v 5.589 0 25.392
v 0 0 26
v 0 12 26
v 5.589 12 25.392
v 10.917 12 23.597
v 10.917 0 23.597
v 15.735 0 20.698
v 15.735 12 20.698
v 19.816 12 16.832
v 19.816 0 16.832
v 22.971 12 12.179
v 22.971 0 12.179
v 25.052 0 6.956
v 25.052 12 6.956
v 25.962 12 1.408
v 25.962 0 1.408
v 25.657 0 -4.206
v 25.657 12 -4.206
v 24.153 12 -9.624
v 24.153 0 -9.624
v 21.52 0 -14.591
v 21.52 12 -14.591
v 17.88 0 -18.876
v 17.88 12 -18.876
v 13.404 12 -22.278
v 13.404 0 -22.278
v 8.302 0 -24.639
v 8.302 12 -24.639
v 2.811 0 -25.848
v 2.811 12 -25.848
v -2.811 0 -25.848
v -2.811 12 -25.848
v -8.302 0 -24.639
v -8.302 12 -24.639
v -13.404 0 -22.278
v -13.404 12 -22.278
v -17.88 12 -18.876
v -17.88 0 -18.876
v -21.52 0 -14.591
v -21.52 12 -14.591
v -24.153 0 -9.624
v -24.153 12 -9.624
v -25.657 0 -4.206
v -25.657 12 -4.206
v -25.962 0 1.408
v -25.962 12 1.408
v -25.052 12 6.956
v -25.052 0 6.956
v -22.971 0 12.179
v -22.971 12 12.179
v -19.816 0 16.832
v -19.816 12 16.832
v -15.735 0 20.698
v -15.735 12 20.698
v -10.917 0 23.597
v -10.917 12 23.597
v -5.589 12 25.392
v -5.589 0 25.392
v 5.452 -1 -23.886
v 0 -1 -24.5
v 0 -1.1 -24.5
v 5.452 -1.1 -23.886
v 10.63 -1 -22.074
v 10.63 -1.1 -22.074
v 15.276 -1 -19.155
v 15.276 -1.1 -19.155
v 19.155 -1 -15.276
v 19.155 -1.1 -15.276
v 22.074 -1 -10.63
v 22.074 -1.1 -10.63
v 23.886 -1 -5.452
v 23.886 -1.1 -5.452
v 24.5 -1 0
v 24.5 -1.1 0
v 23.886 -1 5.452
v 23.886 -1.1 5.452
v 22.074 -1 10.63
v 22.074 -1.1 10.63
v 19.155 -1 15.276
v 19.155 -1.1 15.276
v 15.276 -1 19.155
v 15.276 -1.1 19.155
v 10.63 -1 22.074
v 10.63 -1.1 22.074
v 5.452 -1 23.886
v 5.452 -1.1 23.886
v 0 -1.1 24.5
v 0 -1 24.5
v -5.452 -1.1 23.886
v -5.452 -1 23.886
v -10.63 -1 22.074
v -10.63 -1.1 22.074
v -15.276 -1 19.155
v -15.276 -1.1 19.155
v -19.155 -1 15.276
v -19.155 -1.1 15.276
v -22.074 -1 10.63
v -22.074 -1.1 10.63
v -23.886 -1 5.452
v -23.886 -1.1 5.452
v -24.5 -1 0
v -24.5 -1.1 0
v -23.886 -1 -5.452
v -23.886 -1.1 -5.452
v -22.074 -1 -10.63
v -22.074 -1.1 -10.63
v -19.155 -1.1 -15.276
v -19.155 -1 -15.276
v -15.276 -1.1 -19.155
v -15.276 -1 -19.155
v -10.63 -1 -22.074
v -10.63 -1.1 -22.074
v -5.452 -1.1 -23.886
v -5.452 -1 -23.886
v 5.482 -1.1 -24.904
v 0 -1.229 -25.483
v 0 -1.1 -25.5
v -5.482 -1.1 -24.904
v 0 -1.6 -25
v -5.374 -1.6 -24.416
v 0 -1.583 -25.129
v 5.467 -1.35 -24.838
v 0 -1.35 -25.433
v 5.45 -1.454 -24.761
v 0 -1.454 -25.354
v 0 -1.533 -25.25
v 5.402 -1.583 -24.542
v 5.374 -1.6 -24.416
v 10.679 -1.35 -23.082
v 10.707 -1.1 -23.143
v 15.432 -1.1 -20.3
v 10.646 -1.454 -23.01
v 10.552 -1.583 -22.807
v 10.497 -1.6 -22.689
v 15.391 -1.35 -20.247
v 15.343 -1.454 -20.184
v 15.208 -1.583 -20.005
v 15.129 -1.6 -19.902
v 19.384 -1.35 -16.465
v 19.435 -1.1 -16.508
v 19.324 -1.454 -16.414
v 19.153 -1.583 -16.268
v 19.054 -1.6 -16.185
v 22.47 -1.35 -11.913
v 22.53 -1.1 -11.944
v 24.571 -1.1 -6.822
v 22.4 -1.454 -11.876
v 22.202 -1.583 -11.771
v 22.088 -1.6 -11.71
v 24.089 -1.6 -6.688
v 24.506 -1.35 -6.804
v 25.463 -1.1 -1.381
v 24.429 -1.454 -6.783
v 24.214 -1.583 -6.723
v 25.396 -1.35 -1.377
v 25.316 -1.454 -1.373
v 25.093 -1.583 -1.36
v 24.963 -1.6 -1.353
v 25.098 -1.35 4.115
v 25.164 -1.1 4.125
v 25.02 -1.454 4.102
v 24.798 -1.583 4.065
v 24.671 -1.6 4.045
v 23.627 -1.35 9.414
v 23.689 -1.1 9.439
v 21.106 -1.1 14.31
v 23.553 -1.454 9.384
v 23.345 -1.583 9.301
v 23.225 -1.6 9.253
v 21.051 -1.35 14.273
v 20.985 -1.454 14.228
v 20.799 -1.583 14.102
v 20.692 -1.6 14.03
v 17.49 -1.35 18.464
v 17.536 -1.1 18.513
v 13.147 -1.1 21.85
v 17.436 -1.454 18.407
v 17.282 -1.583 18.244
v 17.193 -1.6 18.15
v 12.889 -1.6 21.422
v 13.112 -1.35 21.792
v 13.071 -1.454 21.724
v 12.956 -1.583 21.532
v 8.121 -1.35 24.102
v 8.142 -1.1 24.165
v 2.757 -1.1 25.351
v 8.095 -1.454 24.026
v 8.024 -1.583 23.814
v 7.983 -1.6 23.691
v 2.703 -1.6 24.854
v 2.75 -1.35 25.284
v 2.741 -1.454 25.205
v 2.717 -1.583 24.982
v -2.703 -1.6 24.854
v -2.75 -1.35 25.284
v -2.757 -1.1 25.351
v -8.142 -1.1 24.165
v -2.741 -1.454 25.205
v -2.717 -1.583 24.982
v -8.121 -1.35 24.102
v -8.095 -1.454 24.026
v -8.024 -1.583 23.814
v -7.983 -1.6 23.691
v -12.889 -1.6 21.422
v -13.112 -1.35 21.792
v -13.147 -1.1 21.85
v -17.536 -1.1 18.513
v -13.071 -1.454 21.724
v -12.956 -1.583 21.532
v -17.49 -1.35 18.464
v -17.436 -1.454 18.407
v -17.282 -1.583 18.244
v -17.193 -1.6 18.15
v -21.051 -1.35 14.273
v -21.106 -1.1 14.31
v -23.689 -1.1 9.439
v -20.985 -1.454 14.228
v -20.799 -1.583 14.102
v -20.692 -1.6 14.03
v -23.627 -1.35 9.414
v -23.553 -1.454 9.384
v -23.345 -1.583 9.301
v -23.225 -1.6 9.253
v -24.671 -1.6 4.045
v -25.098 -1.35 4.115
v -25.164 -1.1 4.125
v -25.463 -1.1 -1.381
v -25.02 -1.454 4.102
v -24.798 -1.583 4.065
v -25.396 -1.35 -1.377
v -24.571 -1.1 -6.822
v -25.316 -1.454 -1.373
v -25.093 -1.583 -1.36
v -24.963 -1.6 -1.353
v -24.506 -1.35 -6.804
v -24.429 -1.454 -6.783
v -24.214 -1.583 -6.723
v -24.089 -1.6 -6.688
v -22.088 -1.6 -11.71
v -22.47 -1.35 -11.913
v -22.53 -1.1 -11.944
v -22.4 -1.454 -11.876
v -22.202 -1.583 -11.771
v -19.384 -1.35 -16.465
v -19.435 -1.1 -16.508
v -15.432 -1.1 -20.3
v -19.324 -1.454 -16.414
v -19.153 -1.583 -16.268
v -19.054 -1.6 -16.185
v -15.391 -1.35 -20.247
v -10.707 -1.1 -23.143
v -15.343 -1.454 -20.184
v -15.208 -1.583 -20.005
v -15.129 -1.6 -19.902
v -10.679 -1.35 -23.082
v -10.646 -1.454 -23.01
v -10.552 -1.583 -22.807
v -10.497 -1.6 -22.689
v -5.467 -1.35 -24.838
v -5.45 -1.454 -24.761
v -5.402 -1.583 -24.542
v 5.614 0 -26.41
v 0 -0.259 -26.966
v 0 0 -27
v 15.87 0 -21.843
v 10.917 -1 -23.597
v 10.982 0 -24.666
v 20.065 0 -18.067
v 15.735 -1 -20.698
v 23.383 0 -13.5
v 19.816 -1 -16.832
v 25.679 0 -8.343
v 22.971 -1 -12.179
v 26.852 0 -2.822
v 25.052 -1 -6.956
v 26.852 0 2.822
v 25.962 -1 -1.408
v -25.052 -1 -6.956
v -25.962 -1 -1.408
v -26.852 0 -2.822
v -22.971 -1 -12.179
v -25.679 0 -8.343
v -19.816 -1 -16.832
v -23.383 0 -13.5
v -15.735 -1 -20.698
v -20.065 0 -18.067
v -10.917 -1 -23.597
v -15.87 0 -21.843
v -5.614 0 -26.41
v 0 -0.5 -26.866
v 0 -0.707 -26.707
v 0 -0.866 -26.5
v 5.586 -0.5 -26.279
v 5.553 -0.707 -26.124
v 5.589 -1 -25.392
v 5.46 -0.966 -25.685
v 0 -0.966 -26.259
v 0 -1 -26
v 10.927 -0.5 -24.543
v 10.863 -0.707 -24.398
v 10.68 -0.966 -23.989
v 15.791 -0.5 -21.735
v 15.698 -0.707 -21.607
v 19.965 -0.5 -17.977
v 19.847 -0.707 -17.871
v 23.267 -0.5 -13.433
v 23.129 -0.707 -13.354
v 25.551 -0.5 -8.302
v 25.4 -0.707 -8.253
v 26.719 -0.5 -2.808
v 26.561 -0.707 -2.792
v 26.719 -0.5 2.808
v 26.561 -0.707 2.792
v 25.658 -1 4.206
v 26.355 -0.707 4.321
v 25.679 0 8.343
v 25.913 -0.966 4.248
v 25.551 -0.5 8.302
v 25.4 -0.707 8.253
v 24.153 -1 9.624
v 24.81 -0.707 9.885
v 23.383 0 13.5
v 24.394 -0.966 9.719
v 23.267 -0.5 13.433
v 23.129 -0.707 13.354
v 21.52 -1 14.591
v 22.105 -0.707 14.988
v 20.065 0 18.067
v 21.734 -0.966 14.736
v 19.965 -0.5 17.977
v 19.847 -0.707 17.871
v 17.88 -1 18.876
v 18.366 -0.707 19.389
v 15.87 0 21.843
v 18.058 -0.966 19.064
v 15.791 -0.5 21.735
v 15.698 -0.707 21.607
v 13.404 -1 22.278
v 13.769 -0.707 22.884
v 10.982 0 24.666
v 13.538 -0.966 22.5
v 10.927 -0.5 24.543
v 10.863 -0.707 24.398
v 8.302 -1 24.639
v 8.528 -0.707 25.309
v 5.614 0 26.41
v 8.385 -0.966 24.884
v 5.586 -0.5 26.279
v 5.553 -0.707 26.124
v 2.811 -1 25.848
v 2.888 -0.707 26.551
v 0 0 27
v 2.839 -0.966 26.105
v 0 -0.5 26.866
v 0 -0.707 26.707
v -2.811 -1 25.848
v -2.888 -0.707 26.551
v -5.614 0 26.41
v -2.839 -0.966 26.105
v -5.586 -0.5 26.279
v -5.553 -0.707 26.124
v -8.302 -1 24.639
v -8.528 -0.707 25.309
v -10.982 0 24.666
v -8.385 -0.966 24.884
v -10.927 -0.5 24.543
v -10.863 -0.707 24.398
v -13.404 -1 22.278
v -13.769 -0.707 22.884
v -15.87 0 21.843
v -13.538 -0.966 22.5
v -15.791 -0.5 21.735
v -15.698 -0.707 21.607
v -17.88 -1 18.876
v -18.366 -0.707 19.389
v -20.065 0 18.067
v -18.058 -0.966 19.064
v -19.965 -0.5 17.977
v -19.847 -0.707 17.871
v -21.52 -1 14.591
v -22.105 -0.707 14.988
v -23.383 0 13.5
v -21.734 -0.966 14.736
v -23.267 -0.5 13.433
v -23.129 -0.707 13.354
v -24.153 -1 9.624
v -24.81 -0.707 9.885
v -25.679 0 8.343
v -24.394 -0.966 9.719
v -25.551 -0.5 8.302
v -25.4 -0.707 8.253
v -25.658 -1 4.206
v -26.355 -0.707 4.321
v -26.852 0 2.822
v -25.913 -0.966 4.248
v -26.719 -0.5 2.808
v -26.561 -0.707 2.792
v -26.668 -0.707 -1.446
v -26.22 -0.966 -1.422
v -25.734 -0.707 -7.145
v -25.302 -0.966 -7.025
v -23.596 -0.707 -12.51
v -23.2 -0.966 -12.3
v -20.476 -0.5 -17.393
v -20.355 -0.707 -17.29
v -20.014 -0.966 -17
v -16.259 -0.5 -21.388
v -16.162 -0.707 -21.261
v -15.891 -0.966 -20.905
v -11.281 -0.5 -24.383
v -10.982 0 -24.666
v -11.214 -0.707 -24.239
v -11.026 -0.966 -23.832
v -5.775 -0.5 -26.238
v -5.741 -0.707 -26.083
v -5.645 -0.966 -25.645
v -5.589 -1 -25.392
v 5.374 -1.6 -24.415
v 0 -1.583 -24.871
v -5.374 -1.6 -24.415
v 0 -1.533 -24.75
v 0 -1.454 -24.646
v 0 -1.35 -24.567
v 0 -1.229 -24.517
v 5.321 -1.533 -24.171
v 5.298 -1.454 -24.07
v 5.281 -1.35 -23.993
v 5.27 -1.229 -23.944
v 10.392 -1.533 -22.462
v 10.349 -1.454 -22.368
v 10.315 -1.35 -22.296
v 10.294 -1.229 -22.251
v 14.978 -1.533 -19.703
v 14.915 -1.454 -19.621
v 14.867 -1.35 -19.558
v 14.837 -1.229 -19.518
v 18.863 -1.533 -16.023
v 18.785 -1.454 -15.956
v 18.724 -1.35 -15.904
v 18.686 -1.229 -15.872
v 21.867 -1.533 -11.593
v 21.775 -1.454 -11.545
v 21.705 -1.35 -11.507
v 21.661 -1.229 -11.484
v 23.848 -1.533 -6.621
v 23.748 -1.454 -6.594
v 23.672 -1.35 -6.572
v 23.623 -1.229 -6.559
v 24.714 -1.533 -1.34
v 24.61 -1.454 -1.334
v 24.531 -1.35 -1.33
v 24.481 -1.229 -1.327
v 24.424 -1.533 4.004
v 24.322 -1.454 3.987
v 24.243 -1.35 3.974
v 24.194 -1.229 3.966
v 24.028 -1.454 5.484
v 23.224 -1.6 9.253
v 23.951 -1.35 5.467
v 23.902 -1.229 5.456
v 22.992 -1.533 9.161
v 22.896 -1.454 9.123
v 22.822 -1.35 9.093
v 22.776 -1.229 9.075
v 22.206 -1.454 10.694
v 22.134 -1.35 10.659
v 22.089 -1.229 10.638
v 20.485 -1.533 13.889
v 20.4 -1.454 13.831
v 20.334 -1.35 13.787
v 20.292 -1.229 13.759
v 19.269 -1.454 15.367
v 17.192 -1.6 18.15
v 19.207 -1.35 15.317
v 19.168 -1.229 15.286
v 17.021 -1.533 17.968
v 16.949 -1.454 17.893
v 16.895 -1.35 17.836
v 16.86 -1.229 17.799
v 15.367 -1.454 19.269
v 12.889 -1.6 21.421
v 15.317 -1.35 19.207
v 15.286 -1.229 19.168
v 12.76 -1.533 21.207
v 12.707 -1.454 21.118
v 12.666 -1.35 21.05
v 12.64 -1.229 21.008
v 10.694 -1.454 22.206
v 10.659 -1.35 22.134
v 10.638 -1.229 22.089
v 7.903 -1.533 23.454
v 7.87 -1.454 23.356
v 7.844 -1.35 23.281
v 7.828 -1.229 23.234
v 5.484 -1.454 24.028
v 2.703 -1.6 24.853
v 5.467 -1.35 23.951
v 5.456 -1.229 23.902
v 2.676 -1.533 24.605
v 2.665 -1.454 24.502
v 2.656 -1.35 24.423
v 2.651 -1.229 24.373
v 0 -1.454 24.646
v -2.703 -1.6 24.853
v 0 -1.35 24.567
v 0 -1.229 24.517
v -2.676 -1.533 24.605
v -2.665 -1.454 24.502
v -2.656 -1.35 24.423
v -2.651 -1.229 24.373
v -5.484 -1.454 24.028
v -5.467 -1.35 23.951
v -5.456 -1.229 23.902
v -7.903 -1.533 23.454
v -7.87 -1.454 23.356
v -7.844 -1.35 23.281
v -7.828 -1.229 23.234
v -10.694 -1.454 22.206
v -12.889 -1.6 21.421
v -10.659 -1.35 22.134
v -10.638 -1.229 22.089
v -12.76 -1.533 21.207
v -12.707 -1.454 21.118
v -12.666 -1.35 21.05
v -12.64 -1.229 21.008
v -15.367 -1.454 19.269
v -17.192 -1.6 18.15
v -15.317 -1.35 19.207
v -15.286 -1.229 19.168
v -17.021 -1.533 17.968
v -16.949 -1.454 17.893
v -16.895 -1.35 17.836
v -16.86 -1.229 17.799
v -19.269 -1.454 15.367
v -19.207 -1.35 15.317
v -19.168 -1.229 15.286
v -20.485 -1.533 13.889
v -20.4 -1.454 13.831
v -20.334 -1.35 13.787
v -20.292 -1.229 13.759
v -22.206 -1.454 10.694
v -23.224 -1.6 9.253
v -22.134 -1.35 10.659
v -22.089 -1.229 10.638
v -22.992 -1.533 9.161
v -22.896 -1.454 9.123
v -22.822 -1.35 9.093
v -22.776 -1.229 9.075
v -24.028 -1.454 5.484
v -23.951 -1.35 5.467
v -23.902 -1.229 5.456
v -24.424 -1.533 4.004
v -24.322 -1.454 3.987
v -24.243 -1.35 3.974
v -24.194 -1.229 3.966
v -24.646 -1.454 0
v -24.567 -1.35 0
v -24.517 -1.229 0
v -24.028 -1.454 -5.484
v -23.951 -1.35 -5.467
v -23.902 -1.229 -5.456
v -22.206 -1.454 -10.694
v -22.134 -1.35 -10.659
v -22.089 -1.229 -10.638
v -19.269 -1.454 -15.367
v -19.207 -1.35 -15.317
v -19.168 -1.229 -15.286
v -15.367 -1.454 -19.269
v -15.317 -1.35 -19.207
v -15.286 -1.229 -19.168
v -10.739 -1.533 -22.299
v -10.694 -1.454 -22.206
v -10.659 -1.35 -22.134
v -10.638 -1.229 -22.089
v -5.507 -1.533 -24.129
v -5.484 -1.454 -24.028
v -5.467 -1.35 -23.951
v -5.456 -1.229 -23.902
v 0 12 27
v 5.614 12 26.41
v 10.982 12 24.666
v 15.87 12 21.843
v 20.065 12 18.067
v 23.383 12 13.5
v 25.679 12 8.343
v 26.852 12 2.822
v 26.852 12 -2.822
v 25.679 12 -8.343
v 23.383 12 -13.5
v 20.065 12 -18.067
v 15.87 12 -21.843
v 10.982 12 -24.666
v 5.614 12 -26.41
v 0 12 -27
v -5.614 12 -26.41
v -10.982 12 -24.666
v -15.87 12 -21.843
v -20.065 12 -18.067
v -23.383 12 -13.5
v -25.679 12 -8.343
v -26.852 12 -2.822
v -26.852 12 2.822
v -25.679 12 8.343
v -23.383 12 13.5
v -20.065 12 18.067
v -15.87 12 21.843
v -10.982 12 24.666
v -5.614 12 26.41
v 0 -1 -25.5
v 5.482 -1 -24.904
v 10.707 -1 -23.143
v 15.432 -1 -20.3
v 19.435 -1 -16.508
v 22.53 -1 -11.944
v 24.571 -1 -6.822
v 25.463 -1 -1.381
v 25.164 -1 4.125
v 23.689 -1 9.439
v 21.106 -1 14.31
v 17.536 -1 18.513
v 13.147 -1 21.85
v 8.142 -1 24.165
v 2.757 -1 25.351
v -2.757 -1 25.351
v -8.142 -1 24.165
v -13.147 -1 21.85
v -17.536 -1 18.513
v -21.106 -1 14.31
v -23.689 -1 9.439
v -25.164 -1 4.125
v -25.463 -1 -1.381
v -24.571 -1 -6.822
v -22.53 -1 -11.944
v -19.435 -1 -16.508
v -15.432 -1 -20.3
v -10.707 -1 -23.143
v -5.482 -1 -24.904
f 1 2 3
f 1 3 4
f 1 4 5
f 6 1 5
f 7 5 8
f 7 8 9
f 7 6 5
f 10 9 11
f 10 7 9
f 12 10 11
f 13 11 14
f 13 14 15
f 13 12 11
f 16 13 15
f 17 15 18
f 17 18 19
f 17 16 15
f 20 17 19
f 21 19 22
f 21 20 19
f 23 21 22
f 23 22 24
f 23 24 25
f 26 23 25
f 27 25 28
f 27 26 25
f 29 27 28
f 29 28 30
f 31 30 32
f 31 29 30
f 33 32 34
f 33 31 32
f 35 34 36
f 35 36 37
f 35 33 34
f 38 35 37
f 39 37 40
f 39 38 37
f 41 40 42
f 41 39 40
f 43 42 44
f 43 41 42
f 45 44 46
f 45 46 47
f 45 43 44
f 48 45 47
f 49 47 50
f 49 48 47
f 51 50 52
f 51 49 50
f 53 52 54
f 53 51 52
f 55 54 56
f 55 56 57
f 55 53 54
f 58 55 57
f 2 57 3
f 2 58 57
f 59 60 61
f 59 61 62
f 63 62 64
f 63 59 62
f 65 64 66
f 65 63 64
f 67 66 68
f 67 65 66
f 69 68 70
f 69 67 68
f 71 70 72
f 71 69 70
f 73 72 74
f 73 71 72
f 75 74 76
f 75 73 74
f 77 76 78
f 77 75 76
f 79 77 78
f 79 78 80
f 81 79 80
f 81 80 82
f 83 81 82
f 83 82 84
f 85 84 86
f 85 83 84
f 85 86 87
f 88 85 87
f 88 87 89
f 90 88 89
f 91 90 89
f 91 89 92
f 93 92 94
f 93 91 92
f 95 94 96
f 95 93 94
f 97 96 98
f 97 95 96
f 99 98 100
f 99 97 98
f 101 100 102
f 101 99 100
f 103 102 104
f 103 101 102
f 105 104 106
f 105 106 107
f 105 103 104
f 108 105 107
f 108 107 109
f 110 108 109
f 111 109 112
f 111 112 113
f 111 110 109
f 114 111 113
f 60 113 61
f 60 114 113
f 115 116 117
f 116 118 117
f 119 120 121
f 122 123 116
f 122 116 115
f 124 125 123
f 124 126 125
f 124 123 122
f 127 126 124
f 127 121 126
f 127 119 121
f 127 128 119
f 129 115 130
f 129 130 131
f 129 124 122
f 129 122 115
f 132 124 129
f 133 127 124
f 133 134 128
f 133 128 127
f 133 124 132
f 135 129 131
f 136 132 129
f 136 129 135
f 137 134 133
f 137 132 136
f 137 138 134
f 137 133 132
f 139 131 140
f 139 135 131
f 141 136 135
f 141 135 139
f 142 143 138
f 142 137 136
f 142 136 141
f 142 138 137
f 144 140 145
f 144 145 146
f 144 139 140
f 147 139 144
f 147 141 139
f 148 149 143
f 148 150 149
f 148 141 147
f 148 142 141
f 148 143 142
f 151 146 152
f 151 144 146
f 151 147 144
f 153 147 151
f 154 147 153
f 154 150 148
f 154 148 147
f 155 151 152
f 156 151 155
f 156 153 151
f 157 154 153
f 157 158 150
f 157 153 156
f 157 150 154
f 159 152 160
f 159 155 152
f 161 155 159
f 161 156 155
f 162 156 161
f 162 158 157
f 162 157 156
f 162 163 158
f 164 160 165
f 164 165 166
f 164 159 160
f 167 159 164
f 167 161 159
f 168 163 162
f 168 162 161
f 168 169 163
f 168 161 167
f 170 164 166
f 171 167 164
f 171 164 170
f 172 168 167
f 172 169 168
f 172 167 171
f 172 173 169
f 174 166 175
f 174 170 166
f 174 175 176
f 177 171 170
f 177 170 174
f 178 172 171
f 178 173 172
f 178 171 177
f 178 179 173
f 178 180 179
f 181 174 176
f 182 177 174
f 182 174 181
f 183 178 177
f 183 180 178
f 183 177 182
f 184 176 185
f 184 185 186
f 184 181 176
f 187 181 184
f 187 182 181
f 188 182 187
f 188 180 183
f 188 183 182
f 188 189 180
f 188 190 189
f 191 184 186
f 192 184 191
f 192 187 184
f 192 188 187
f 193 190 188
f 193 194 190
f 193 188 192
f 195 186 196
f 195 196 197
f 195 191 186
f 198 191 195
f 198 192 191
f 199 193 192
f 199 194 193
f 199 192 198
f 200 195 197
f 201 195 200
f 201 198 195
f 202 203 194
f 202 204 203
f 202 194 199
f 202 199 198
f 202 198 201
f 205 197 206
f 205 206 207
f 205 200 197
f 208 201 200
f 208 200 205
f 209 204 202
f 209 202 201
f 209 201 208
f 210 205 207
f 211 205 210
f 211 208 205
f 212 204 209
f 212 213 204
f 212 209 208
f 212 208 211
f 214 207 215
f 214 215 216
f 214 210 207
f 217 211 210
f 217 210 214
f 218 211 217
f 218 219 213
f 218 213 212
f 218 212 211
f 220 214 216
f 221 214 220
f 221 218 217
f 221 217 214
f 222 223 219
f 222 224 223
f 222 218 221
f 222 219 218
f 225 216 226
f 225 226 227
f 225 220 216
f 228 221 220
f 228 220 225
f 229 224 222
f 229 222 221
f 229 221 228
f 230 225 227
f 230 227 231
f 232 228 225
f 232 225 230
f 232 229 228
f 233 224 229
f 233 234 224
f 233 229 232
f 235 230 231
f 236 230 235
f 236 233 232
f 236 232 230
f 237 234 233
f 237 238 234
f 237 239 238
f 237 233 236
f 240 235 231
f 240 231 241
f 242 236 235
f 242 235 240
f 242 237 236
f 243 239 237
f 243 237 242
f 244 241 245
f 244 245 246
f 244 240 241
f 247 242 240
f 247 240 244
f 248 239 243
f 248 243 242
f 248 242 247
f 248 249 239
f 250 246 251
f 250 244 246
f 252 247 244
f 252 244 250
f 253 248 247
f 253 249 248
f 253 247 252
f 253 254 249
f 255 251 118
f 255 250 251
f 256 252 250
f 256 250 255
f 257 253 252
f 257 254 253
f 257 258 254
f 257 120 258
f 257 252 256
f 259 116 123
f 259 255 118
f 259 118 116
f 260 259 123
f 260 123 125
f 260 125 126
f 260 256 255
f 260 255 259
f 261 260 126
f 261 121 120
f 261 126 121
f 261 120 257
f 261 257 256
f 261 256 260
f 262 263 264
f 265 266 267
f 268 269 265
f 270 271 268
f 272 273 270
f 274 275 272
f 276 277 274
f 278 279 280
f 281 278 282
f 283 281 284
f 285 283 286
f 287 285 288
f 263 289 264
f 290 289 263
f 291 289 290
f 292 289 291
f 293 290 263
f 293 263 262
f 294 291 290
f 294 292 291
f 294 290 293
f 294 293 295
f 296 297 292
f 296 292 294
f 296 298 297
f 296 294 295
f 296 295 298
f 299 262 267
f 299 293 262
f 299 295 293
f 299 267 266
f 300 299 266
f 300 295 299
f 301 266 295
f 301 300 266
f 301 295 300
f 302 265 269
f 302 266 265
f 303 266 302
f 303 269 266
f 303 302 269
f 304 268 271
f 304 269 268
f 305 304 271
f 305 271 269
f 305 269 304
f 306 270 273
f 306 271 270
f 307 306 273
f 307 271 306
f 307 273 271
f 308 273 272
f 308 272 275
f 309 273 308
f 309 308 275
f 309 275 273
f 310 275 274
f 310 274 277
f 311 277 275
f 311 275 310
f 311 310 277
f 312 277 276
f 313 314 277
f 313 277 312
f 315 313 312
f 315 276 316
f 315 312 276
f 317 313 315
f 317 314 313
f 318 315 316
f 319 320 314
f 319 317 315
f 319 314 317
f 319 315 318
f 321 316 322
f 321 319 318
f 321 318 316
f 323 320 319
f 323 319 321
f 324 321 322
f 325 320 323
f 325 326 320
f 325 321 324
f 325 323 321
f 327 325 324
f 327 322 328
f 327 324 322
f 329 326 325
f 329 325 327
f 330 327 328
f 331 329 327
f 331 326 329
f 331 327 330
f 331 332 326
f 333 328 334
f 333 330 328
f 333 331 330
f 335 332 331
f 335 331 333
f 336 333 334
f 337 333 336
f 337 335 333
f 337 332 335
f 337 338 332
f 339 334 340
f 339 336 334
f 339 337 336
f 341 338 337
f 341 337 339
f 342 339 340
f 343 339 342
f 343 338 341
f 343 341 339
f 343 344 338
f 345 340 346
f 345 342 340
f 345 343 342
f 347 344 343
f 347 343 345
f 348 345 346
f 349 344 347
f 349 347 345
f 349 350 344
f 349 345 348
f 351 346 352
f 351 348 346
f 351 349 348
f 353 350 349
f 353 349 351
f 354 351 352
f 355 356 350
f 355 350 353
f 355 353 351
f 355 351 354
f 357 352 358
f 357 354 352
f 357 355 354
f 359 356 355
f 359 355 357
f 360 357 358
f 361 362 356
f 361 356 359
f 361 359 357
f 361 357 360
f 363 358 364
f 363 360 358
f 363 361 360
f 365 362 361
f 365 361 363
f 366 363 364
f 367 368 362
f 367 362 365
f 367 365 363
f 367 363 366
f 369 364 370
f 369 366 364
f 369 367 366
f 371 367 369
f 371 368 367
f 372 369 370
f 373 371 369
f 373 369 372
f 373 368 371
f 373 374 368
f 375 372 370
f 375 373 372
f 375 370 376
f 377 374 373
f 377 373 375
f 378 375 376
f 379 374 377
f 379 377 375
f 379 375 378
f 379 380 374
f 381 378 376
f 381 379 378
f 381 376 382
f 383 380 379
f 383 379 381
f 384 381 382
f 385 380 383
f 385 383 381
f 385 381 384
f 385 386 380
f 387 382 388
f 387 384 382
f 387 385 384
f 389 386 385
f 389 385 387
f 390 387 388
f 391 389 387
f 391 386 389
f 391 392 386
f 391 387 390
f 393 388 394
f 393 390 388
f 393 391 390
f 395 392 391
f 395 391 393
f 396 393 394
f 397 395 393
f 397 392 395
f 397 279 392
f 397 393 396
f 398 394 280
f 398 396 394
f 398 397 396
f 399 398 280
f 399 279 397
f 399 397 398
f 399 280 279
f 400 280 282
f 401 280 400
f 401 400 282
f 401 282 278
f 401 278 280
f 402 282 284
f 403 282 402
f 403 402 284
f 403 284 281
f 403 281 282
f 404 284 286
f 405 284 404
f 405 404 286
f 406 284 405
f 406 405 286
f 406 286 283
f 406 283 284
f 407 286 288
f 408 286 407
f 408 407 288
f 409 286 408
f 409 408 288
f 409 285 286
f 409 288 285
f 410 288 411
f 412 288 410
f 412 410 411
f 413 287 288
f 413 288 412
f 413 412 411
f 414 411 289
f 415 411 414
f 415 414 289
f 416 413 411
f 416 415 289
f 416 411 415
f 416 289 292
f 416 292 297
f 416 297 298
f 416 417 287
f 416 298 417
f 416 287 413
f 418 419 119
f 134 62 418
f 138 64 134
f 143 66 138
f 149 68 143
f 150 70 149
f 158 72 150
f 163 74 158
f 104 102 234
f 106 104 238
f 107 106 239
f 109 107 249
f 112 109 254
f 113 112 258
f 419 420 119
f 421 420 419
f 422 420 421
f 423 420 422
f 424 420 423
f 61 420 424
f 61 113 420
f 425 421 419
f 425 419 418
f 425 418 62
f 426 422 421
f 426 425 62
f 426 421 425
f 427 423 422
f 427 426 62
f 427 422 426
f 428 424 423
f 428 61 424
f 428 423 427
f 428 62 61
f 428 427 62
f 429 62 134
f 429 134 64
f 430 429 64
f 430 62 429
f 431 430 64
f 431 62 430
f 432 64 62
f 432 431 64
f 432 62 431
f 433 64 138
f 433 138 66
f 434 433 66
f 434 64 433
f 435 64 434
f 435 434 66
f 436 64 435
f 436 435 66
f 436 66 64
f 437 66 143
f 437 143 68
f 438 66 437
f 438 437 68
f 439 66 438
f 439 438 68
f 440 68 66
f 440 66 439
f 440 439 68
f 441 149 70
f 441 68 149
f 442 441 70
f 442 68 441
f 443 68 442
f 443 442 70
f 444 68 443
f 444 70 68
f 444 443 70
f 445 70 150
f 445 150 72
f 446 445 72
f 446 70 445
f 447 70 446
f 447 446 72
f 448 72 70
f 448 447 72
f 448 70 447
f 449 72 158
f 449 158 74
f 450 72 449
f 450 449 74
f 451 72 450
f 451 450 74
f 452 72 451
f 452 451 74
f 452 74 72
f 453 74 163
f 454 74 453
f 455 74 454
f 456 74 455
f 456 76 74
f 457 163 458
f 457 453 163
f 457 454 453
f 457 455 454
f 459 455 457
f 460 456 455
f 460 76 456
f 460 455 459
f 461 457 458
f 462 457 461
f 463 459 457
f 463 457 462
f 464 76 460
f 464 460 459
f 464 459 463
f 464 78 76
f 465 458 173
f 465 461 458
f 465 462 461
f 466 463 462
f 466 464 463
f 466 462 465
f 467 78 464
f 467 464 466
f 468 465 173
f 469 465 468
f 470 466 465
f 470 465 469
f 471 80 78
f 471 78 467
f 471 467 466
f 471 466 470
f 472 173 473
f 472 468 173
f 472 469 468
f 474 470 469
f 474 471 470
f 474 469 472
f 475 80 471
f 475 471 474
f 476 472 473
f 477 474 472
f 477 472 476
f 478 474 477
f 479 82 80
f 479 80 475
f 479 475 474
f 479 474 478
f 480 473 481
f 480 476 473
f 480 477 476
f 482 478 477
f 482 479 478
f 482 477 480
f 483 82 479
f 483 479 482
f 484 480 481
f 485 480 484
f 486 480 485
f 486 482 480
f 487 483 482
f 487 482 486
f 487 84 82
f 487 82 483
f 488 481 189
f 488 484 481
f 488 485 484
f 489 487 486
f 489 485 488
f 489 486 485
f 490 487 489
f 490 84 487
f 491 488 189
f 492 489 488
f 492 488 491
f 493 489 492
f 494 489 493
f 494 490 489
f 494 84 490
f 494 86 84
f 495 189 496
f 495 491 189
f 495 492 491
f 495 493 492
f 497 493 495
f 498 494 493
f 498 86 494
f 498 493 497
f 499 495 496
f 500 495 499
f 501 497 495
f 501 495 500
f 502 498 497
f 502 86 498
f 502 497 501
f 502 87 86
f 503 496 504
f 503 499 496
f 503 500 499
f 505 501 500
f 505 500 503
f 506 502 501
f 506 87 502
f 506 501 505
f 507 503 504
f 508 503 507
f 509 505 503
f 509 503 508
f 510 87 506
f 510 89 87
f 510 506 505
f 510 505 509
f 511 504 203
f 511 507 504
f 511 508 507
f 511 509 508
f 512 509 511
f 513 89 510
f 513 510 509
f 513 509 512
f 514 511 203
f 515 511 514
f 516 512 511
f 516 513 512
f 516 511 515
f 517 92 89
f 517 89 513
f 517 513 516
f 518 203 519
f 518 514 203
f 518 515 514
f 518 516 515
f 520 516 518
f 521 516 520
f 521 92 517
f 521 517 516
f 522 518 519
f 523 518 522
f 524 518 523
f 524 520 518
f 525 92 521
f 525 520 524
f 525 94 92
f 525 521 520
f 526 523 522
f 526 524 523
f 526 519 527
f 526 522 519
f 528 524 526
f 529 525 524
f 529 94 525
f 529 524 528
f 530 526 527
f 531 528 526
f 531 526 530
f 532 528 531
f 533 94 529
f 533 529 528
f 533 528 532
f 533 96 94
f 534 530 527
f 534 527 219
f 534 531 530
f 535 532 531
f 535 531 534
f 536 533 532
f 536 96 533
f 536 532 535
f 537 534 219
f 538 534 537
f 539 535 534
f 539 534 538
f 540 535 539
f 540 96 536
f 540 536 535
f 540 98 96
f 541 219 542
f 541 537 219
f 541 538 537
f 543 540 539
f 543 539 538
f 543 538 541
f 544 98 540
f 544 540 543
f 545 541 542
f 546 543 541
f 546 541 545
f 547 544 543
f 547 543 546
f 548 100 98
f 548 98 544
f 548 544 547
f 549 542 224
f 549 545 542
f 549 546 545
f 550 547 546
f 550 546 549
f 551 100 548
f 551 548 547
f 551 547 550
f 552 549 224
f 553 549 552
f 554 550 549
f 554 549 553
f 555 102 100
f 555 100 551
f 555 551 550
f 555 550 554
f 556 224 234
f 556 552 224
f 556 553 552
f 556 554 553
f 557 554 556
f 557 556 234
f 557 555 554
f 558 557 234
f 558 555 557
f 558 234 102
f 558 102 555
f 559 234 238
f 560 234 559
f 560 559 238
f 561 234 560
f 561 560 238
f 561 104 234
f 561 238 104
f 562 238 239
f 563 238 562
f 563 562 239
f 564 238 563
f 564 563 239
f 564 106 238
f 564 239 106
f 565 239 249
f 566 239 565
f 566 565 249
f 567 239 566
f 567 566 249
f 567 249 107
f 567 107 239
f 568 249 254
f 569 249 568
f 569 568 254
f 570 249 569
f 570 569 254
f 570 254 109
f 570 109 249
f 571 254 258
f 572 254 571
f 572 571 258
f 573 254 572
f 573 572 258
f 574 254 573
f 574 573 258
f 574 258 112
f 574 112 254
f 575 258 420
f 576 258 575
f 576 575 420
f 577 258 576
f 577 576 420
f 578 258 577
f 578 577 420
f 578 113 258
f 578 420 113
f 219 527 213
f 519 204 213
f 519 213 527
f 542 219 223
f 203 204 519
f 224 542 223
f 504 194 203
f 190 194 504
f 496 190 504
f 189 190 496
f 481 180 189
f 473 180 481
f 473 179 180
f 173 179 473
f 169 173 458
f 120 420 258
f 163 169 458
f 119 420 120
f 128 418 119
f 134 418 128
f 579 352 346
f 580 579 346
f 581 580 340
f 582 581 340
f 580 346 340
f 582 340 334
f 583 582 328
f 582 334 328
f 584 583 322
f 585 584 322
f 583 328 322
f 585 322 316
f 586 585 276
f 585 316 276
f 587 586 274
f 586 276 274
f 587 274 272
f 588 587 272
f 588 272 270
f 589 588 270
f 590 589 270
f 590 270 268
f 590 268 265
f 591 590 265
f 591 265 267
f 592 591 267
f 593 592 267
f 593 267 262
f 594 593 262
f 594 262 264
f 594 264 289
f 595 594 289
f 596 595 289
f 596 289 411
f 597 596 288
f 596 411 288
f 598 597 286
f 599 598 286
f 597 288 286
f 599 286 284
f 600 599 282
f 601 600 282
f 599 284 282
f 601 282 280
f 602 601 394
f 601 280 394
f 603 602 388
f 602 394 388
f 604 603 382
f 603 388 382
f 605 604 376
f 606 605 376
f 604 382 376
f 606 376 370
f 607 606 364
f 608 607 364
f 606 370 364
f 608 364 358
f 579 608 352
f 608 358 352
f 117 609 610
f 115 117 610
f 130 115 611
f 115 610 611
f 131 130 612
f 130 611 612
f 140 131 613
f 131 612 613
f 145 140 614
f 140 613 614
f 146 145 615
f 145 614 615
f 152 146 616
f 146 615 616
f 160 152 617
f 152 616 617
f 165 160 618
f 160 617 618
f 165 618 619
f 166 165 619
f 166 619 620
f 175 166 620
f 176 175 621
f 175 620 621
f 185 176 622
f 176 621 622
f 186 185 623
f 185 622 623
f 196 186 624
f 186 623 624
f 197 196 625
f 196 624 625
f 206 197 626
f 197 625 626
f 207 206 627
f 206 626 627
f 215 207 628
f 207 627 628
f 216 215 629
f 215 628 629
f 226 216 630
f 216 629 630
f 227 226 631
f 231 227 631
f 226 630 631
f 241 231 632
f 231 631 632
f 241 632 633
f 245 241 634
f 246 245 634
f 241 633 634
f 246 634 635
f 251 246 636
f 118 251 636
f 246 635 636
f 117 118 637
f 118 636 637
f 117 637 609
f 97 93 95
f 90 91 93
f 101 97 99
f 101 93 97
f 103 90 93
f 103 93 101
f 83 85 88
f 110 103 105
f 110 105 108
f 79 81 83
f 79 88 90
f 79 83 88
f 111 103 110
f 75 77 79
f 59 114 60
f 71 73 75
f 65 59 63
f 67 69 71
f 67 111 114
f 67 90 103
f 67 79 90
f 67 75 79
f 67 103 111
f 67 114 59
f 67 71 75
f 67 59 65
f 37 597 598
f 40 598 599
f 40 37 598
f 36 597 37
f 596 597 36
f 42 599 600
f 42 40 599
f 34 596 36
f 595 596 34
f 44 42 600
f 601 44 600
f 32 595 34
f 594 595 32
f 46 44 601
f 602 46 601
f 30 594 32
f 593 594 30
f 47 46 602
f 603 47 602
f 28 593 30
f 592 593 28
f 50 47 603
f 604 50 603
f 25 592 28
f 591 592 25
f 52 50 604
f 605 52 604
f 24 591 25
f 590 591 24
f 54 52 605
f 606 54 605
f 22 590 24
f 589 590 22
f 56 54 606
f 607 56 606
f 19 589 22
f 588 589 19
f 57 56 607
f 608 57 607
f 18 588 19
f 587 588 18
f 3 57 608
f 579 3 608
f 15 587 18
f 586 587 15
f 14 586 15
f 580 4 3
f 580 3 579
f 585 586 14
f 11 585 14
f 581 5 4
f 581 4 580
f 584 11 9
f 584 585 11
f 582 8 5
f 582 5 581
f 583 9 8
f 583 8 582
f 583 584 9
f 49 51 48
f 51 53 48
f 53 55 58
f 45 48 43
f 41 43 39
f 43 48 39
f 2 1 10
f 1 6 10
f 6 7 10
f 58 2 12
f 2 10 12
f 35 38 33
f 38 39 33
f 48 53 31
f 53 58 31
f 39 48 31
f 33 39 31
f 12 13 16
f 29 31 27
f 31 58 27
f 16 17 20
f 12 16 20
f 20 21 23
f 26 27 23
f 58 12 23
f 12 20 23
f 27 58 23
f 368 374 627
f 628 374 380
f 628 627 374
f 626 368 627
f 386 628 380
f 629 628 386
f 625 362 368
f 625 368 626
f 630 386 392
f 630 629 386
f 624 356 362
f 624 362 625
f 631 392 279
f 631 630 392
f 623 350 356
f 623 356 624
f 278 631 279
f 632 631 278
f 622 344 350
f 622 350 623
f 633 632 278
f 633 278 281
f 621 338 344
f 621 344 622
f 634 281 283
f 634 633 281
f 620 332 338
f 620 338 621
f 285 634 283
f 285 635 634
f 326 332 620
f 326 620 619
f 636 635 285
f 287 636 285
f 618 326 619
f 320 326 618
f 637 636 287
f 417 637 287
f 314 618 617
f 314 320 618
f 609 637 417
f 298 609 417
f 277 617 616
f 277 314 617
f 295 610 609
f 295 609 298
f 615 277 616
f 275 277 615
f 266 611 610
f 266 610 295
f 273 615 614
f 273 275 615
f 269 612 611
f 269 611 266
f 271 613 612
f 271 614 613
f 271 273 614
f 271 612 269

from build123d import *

# Parameters (mm, degrees)
SKETCH1_R           = 27
SKETCH1_R_2         = 26
BOSS_EXTRUDE1_DEPTH = 12
BOSS_EXTRUDE2_START = 1
SKETCH2_R           = 27
BOSS_EXTRUDE2_DEPTH = 1
SKETCH3_R           = 25.5
SKETCH3_R_2         = 24.5
BOSS_EXTRUDE3_DEPTH = 0.6
FILLET1_R           = 1
FILLET2_R           = 0.5


with BuildPart() as part:
    # Sketch1 → Boss-Extrude1 (new body)
    with BuildSketch(Plane(origin=(0, 0, 0), x_dir=(1, 0, 0), z_dir=(0, 1, 0))):
        with Locations(Location((0, 0, 0), (0, 0, 270))):
            Circle(SKETCH1_R)
        with Locations(Location((0, 0, 0), (0, 0, 270))):
            Circle(SKETCH1_R_2, mode=Mode.SUBTRACT)
    extrude(amount=BOSS_EXTRUDE1_DEPTH)

    # Sketch2 → Boss-Extrude2 (add)
    with BuildSketch(Plane.XZ.offset(BOSS_EXTRUDE2_START)):
        with Locations(Location((0, 0, 0), (0, 0, 270))):
            Circle(SKETCH2_R)
    extrude(amount=-BOSS_EXTRUDE2_DEPTH)

    # Sketch3 → Boss-Extrude3 (add)
    with BuildSketch(Plane.XZ.offset(1)):
        with Locations(Location((0, 0, 0), (0, 0, 270))):
            Circle(SKETCH3_R)
        with Locations(Location((0, 0, 0), (0, 0, 270))):
            Circle(SKETCH3_R_2, mode=Mode.SUBTRACT)
    extrude(amount=BOSS_EXTRUDE3_DEPTH)

    # Fillet1
    fillet1_edges = [part.edges().sort_by_distance(p)[0] for p in [
        (0, -1, 27),
    ]]
    fillet(fillet1_edges, radius=FILLET1_R - 0.0001)  # a hair under: the kernel refuses the full size

    # Fillet2
    fillet2_edges = [part.edges().sort_by_distance(p)[0] for p in [
        (0, -1.6, 25.5),
        (0, -1.6, 24.5),
    ]]
    fillet(fillet2_edges, radius=FILLET2_R - 0.0001)  # a hair under: the kernel refuses the full size


solid = part.part
